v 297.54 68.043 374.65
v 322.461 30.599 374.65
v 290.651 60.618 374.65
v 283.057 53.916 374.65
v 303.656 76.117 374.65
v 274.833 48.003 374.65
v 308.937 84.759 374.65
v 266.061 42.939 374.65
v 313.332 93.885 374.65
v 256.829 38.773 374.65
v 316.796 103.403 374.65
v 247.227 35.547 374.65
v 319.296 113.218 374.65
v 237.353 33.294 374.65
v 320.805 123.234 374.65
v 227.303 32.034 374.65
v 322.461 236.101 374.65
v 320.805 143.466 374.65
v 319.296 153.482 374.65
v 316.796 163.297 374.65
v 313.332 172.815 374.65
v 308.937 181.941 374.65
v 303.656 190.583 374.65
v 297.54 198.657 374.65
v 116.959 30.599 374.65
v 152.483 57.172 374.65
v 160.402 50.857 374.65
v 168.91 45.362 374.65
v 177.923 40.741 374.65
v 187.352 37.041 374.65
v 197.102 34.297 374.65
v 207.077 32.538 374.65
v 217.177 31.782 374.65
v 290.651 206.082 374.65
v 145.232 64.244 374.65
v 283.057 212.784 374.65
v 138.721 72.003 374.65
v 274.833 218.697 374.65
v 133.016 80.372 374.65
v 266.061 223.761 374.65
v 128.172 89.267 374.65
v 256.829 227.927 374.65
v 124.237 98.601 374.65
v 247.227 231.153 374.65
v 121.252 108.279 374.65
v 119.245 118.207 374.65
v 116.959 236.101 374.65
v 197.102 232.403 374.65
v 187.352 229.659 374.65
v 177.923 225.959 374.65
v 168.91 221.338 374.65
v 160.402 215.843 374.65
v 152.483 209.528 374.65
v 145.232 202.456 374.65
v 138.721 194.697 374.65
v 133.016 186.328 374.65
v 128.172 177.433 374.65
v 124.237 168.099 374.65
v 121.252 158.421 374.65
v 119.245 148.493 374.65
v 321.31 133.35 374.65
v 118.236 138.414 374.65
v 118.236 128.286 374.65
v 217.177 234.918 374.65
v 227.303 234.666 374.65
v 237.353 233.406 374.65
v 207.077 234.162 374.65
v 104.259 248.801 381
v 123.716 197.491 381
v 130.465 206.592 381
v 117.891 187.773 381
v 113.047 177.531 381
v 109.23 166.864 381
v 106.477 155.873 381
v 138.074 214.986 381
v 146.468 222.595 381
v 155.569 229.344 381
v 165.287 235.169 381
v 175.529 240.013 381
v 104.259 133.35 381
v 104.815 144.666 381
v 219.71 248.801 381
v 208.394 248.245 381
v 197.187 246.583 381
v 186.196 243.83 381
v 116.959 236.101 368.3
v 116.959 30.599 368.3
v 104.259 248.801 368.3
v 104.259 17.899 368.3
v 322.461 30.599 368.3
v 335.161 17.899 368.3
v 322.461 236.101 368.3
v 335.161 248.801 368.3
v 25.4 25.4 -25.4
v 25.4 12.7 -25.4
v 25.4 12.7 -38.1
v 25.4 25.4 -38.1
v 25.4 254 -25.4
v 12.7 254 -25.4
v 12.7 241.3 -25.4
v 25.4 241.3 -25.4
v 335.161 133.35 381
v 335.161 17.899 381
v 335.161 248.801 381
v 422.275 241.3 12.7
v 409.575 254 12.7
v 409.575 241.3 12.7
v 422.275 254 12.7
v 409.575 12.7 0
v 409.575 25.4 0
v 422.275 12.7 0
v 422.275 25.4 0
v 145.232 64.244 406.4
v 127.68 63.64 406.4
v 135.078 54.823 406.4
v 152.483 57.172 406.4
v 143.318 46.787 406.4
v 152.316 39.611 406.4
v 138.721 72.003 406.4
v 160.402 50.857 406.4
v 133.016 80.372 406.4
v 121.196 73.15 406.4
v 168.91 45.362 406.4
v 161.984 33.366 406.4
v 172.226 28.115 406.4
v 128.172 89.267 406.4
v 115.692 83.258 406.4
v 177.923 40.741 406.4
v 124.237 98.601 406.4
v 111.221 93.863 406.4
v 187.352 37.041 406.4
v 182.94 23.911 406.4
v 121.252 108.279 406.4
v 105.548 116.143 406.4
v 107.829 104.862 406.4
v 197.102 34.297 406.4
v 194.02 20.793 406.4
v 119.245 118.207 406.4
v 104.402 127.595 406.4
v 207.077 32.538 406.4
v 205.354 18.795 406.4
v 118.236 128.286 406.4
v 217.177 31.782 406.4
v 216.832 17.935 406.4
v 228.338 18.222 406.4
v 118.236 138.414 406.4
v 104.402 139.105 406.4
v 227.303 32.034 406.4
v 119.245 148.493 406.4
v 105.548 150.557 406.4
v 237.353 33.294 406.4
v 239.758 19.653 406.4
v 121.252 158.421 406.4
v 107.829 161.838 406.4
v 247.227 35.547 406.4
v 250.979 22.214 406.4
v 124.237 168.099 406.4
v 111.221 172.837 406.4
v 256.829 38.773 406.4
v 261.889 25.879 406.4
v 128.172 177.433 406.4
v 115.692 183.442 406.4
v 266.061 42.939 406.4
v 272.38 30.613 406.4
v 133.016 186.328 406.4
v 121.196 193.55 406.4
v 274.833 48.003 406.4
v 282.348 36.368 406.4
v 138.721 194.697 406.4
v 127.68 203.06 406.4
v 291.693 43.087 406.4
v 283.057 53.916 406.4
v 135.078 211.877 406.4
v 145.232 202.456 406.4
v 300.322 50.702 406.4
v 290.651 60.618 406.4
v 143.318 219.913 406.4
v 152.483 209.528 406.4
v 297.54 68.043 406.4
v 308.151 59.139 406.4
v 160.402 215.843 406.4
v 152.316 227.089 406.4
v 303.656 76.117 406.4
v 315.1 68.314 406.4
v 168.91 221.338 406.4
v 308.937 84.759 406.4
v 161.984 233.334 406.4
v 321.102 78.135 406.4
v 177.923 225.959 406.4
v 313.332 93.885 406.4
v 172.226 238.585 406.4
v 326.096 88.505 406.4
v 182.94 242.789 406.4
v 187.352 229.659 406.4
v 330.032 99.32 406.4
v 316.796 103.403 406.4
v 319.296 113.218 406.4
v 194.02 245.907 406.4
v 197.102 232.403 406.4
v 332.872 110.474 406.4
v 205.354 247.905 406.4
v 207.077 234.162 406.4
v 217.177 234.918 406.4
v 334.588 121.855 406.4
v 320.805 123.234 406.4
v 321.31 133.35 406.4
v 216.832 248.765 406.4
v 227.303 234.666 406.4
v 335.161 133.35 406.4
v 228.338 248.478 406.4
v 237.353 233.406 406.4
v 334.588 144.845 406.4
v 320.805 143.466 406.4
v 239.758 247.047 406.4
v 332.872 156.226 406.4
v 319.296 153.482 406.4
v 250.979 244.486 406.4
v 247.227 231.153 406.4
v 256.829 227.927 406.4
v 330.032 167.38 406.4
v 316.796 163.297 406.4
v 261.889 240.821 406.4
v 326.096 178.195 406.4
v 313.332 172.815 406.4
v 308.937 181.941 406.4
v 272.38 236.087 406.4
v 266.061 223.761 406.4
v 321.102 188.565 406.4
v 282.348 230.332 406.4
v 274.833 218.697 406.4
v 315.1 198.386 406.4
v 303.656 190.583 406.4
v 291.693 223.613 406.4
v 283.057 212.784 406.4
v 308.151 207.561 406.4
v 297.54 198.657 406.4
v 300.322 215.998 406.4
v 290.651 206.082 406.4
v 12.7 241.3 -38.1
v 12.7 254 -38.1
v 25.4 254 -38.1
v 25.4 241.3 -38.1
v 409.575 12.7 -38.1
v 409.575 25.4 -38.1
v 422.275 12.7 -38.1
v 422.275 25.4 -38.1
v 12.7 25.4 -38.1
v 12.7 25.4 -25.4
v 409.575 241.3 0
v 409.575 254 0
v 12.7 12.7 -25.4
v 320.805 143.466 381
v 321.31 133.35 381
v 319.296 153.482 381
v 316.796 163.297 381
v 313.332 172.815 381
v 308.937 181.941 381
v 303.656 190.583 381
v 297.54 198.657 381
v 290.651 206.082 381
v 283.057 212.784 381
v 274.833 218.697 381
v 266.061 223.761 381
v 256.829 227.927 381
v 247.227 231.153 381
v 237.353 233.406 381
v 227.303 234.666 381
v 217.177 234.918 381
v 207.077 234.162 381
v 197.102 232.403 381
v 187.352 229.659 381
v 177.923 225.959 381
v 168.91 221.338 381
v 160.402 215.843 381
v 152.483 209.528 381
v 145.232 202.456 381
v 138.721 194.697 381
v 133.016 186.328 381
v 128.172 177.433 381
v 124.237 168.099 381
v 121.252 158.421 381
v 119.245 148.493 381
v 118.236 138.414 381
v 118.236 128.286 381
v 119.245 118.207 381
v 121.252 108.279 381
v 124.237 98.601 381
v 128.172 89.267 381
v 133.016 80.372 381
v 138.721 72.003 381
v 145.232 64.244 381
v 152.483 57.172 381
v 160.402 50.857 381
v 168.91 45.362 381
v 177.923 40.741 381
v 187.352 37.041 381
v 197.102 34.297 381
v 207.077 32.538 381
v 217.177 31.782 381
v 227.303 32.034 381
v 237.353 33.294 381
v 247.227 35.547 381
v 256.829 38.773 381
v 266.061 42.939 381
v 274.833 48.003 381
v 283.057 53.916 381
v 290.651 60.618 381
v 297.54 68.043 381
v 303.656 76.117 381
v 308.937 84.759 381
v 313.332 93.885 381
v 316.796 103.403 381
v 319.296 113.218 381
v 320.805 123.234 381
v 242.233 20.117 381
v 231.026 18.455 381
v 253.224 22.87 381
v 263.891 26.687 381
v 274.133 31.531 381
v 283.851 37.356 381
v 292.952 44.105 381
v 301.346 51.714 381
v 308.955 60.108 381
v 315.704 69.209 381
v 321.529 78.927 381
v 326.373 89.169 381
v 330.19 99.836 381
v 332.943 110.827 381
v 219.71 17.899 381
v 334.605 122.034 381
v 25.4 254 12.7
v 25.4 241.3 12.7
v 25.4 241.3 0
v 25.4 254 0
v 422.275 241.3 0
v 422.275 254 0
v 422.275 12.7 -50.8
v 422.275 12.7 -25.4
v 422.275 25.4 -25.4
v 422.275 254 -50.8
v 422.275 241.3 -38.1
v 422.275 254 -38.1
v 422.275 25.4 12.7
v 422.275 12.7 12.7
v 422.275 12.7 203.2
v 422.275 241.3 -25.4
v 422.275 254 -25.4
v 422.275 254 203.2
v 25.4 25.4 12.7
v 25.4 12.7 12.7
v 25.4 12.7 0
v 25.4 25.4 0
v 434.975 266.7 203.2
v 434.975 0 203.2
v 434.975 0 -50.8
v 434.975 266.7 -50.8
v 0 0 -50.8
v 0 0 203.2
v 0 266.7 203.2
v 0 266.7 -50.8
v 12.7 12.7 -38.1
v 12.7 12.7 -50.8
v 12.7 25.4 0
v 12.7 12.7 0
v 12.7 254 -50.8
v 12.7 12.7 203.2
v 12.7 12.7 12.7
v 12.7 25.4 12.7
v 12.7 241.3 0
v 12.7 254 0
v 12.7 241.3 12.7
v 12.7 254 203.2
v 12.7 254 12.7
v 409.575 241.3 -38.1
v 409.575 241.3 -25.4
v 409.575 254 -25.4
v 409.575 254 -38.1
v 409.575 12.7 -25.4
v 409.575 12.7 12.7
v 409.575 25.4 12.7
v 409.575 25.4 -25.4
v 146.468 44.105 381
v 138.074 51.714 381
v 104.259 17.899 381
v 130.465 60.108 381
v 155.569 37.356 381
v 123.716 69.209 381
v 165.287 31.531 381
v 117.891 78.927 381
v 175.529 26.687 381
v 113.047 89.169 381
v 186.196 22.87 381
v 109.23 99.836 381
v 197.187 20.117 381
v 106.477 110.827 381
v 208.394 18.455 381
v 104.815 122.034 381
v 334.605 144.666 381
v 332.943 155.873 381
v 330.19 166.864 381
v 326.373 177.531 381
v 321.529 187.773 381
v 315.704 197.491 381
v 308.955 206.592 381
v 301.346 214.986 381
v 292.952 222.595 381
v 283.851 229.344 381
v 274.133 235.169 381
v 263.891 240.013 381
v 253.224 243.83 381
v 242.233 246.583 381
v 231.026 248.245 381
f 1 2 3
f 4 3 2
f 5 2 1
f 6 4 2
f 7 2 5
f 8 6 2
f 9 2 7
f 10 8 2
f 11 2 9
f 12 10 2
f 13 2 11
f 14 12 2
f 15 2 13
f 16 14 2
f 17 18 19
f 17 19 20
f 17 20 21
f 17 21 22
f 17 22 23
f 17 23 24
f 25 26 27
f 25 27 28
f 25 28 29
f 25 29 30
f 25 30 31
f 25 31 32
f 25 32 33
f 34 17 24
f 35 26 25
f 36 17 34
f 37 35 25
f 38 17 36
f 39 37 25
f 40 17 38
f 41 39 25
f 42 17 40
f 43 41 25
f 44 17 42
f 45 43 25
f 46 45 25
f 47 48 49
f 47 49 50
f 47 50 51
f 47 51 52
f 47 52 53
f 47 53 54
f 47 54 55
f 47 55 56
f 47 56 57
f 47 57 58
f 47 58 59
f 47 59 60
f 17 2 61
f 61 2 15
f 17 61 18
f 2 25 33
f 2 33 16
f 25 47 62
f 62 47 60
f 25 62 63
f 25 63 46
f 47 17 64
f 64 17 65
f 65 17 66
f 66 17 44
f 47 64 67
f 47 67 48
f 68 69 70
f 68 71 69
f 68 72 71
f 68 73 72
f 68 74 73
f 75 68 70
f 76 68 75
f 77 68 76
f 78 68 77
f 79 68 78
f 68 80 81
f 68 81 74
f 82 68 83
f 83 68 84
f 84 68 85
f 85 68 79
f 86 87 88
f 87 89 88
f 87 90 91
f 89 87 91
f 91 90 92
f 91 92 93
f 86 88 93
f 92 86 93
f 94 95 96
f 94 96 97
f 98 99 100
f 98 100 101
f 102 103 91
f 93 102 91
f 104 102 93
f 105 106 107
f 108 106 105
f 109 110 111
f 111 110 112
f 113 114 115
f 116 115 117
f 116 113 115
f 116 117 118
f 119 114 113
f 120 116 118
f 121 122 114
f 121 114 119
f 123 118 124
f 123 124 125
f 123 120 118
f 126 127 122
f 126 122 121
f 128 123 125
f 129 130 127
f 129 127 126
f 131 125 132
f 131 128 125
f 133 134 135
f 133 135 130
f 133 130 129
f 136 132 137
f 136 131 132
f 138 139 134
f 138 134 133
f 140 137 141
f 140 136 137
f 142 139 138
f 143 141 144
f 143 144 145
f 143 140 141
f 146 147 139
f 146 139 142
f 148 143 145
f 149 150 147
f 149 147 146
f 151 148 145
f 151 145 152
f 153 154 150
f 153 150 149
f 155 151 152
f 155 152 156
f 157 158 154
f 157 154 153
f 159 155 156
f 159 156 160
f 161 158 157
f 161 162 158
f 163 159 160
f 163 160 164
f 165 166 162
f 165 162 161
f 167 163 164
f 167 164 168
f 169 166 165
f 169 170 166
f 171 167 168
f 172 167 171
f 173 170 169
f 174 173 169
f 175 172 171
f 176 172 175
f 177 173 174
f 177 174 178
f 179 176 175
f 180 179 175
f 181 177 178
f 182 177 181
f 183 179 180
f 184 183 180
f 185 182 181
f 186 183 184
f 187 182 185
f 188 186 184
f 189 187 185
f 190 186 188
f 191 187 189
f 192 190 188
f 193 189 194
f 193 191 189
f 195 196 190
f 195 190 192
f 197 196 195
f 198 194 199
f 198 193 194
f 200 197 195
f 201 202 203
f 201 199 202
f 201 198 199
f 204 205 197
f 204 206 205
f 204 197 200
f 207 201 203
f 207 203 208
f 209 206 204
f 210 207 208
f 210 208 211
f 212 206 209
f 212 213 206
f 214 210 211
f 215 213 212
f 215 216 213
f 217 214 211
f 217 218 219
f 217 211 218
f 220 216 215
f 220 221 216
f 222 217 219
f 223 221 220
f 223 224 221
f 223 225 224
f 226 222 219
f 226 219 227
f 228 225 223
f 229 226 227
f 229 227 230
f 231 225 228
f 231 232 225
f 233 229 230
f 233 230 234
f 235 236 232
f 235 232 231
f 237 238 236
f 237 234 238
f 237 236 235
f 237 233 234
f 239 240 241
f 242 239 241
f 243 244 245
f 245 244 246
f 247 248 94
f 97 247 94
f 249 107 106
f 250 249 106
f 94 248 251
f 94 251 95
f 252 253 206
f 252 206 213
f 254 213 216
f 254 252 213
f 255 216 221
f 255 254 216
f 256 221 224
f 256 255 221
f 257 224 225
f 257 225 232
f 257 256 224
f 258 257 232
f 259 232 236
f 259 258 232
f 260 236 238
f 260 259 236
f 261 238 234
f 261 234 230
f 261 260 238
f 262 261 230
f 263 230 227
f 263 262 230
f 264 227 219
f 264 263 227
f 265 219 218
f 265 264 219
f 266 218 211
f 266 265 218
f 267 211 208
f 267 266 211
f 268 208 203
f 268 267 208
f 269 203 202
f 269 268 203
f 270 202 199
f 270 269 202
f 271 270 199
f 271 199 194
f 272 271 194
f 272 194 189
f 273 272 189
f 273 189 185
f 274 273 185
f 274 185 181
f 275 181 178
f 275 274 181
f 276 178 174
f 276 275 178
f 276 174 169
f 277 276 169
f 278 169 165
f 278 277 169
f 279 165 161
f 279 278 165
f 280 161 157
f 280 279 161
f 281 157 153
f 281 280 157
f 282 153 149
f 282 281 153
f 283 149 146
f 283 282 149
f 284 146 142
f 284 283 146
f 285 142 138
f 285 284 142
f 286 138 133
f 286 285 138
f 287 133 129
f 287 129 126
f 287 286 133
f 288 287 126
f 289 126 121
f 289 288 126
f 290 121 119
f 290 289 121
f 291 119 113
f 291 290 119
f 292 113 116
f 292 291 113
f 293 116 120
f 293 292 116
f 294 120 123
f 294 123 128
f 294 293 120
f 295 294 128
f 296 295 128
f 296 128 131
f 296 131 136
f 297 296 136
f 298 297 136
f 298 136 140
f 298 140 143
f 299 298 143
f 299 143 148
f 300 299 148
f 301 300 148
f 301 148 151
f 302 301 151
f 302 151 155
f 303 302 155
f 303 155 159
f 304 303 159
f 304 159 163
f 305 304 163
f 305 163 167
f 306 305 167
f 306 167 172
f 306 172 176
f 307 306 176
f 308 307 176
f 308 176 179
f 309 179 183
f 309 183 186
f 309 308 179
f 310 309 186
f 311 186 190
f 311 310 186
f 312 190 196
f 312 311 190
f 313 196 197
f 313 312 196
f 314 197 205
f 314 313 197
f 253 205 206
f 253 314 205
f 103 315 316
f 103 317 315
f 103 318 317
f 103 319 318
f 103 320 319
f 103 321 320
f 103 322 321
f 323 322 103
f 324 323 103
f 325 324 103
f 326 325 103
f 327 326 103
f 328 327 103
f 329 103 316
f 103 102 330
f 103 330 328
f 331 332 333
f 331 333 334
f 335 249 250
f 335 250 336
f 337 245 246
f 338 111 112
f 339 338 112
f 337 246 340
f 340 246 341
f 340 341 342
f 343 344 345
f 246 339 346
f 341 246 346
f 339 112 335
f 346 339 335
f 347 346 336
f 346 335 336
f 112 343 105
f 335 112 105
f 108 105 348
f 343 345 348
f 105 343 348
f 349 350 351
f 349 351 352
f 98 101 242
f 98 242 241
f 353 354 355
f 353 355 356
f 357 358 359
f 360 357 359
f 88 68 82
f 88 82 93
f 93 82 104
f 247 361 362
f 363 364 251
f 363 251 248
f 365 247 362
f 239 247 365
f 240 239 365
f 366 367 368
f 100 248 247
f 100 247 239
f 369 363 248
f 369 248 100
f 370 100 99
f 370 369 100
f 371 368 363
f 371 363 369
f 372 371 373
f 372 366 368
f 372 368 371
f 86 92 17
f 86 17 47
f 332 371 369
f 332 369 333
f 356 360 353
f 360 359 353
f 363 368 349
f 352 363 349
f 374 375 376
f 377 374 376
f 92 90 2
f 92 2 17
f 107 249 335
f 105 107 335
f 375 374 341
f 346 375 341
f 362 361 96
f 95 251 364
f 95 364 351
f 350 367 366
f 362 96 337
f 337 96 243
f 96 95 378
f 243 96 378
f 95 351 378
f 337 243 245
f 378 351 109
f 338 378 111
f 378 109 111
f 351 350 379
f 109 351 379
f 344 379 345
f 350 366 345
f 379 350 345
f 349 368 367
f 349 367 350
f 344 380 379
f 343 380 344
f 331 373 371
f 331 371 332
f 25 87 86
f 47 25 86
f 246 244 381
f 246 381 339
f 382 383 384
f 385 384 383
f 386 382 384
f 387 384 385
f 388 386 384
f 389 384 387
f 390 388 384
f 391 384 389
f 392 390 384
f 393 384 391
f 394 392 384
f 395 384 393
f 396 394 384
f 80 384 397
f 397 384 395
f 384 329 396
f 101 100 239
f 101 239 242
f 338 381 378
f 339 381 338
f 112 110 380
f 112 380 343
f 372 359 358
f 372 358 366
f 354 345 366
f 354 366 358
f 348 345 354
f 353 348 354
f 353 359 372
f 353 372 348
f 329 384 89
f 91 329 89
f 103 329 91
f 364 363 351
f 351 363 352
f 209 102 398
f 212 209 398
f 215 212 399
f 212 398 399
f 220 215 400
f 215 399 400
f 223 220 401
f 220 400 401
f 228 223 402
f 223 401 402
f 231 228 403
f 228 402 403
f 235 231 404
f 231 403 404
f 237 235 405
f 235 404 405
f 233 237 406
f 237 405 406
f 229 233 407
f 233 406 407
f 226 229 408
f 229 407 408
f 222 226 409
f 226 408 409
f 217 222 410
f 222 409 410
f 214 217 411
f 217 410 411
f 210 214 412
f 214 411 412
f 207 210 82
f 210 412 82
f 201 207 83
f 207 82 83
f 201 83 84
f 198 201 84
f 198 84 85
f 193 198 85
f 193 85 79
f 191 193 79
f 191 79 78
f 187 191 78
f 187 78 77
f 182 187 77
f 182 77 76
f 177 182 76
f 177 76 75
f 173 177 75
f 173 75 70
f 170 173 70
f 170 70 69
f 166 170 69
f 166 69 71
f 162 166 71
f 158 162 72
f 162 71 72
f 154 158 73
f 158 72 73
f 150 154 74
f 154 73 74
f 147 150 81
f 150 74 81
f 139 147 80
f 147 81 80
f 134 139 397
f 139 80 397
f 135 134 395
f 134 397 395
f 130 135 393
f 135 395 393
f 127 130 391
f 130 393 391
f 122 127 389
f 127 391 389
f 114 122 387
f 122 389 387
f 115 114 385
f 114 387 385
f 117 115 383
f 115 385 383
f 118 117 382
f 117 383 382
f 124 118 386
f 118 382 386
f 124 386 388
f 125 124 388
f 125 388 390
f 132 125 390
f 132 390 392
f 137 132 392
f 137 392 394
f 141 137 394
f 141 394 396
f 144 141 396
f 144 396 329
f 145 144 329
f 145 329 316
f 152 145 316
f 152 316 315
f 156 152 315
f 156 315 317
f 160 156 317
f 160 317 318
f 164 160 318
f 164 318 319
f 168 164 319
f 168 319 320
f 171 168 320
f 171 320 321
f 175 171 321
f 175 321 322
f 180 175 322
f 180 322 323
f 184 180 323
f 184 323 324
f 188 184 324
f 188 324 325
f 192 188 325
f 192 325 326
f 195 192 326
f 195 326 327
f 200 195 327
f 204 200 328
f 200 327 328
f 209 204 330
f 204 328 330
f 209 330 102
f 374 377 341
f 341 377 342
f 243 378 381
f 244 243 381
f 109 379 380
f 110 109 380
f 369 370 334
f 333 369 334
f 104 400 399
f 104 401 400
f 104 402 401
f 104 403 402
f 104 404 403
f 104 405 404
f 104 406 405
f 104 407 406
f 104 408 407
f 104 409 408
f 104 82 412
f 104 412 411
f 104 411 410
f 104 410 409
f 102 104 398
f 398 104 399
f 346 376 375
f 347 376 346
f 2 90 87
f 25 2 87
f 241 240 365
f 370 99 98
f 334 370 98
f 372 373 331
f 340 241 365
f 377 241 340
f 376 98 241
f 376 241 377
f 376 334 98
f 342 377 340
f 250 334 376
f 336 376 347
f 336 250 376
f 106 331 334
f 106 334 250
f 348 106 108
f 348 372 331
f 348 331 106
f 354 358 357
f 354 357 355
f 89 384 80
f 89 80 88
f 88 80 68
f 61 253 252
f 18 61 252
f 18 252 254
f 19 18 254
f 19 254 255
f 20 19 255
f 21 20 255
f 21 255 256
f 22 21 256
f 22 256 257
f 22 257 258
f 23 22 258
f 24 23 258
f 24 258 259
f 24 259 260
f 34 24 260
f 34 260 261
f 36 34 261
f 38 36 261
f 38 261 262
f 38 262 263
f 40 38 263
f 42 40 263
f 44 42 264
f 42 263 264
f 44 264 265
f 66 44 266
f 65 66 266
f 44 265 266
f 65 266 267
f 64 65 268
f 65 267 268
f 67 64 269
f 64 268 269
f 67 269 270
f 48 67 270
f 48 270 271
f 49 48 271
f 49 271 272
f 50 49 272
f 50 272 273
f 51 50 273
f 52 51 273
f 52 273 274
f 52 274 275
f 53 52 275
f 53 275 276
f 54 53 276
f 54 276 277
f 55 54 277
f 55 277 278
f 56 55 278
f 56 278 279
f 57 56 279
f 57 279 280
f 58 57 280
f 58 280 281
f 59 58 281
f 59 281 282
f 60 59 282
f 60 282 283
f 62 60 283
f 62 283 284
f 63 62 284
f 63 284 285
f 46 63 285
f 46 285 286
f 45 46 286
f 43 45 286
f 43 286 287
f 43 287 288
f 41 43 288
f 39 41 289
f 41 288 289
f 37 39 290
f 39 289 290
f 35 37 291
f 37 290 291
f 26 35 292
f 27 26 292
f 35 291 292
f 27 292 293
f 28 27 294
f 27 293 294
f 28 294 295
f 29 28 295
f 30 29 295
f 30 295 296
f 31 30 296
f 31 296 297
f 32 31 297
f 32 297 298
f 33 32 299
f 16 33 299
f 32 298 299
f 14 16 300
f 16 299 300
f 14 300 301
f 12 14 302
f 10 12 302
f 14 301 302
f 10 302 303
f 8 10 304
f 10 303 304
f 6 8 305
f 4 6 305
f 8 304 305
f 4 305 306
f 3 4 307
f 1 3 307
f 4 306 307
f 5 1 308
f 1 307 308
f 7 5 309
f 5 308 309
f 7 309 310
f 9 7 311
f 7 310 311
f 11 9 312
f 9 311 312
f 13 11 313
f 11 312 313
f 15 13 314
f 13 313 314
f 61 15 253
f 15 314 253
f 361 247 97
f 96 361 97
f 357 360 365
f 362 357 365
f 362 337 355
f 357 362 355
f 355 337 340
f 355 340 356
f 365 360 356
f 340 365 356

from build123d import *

# Parameters (mm, degrees)
SKETCH1_W           = 434.975
SKETCH1_H           = 266.7
SKETCH1_W_2         = 409.575
SKETCH1_H_2         = 241.3
BOSS_EXTRUDE1_DEPTH = 203.2
SKETCH2_R           = 115.451312682
SKETCH2_R_2         = 101.6
BOSS_EXTRUDE3_DEPTH = 25.4
SKETCH4_W           = 230.902625364
SKETCH4_H           = 230.902625364
SKETCH4_R           = 101.6
BOSS_EXTRUDE4_DEPTH = 12.7
SKETCH8_W           = 205.502625364
SKETCH8_H           = 205.502625364
CUT_EXTRUDE1_DEPTH  = 6.35
SKETCH10_W          = 12.7
SKETCH10_H          = 12.7
BOSS_EXTRUDE5_DEPTH = 12.7
SKETCH1_2_W         = 434.975
SKETCH1_2_H         = 266.7
SKETCH1_2_W_2       = 409.575
SKETCH1_2_H_2       = 241.3
BOSS_EXTRUDE6_DEPTH = 50.8
LPATTERN1_COUNT     = 2
LPATTERN1_PITCH     = 38.1


with BuildPart() as part:
    # Sketch1 → Boss-Extrude1 (new body)
    with BuildSketch(Plane.XY):
        with Locations((217.4875, 133.35)):
            Rectangle(SKETCH1_W, SKETCH1_H)
        with Locations((217.4875, 133.35)):
            Rectangle(SKETCH1_W_2, SKETCH1_H_2, mode=Mode.SUBTRACT)
    extrude(amount=BOSS_EXTRUDE1_DEPTH)

    # Sketch10 → Boss-Extrude5 (add)
    with BuildSketch(Plane.XY):
        with Locations((415.925, 247.65)):
            Rectangle(SKETCH10_W, SKETCH10_H)
        with Locations((19.05, 247.65)):
            Rectangle(SKETCH10_W, SKETCH10_H)
        with Locations((19.05, 19.05)):
            Rectangle(SKETCH10_W, SKETCH10_H)
        with Locations((415.925, 19.05)):
            Rectangle(SKETCH10_W, SKETCH10_H)
    boss_extrude5 = extrude(amount=BOSS_EXTRUDE5_DEPTH)

    # Sketch1<2> → Boss-Extrude6 (add)
    with BuildSketch(Plane.XY):
        with Locations((217.4875, 133.35)):
            Rectangle(SKETCH1_2_W, SKETCH1_2_H)
        with Locations((217.4875, 133.35)):
            Rectangle(SKETCH1_2_W_2, SKETCH1_2_H_2, mode=Mode.SUBTRACT)
    extrude(amount=-BOSS_EXTRUDE6_DEPTH)

    # LPattern1: Boss-Extrude5 ×2
    with Locations(*[(0, 0, -i * LPATTERN1_PITCH) for i in range(1, LPATTERN1_COUNT)]):
        add(boss_extrude5)


with BuildPart() as body_2:
    # Sketch2 → Boss-Extrude3 (new body)
    with BuildSketch(Plane.XY.offset(381)):
        with Locations((219.71, 133.35)):
            Circle(SKETCH2_R)
        with Locations((219.71, 133.35)):
            Circle(SKETCH2_R_2, mode=Mode.SUBTRACT)
    extrude(amount=BOSS_EXTRUDE3_DEPTH)

    # Sketch4 → Boss-Extrude4 (add)
    with BuildSketch(Plane.XY.offset(381)):
        with Locations((219.71, 133.35)):
            Rectangle(SKETCH4_W, SKETCH4_H)
        with Locations((219.71, 133.35)):
            Circle(SKETCH4_R, mode=Mode.SUBTRACT)
    extrude(amount=-BOSS_EXTRUDE4_DEPTH)

    # Sketch8 → Cut-Extrude1 (cut)
    with BuildSketch(Plane(origin=(0, 0, 368.3), x_dir=(-1, 0, 0), z_dir=(0, 0, -1))):
        with Locations((-219.71, 133.35)):
            Rectangle(SKETCH8_W, SKETCH8_H)
    extrude(amount=-CUT_EXTRUDE1_DEPTH, mode=Mode.SUBTRACT)


solid = Compound([part.part, body_2.part])
